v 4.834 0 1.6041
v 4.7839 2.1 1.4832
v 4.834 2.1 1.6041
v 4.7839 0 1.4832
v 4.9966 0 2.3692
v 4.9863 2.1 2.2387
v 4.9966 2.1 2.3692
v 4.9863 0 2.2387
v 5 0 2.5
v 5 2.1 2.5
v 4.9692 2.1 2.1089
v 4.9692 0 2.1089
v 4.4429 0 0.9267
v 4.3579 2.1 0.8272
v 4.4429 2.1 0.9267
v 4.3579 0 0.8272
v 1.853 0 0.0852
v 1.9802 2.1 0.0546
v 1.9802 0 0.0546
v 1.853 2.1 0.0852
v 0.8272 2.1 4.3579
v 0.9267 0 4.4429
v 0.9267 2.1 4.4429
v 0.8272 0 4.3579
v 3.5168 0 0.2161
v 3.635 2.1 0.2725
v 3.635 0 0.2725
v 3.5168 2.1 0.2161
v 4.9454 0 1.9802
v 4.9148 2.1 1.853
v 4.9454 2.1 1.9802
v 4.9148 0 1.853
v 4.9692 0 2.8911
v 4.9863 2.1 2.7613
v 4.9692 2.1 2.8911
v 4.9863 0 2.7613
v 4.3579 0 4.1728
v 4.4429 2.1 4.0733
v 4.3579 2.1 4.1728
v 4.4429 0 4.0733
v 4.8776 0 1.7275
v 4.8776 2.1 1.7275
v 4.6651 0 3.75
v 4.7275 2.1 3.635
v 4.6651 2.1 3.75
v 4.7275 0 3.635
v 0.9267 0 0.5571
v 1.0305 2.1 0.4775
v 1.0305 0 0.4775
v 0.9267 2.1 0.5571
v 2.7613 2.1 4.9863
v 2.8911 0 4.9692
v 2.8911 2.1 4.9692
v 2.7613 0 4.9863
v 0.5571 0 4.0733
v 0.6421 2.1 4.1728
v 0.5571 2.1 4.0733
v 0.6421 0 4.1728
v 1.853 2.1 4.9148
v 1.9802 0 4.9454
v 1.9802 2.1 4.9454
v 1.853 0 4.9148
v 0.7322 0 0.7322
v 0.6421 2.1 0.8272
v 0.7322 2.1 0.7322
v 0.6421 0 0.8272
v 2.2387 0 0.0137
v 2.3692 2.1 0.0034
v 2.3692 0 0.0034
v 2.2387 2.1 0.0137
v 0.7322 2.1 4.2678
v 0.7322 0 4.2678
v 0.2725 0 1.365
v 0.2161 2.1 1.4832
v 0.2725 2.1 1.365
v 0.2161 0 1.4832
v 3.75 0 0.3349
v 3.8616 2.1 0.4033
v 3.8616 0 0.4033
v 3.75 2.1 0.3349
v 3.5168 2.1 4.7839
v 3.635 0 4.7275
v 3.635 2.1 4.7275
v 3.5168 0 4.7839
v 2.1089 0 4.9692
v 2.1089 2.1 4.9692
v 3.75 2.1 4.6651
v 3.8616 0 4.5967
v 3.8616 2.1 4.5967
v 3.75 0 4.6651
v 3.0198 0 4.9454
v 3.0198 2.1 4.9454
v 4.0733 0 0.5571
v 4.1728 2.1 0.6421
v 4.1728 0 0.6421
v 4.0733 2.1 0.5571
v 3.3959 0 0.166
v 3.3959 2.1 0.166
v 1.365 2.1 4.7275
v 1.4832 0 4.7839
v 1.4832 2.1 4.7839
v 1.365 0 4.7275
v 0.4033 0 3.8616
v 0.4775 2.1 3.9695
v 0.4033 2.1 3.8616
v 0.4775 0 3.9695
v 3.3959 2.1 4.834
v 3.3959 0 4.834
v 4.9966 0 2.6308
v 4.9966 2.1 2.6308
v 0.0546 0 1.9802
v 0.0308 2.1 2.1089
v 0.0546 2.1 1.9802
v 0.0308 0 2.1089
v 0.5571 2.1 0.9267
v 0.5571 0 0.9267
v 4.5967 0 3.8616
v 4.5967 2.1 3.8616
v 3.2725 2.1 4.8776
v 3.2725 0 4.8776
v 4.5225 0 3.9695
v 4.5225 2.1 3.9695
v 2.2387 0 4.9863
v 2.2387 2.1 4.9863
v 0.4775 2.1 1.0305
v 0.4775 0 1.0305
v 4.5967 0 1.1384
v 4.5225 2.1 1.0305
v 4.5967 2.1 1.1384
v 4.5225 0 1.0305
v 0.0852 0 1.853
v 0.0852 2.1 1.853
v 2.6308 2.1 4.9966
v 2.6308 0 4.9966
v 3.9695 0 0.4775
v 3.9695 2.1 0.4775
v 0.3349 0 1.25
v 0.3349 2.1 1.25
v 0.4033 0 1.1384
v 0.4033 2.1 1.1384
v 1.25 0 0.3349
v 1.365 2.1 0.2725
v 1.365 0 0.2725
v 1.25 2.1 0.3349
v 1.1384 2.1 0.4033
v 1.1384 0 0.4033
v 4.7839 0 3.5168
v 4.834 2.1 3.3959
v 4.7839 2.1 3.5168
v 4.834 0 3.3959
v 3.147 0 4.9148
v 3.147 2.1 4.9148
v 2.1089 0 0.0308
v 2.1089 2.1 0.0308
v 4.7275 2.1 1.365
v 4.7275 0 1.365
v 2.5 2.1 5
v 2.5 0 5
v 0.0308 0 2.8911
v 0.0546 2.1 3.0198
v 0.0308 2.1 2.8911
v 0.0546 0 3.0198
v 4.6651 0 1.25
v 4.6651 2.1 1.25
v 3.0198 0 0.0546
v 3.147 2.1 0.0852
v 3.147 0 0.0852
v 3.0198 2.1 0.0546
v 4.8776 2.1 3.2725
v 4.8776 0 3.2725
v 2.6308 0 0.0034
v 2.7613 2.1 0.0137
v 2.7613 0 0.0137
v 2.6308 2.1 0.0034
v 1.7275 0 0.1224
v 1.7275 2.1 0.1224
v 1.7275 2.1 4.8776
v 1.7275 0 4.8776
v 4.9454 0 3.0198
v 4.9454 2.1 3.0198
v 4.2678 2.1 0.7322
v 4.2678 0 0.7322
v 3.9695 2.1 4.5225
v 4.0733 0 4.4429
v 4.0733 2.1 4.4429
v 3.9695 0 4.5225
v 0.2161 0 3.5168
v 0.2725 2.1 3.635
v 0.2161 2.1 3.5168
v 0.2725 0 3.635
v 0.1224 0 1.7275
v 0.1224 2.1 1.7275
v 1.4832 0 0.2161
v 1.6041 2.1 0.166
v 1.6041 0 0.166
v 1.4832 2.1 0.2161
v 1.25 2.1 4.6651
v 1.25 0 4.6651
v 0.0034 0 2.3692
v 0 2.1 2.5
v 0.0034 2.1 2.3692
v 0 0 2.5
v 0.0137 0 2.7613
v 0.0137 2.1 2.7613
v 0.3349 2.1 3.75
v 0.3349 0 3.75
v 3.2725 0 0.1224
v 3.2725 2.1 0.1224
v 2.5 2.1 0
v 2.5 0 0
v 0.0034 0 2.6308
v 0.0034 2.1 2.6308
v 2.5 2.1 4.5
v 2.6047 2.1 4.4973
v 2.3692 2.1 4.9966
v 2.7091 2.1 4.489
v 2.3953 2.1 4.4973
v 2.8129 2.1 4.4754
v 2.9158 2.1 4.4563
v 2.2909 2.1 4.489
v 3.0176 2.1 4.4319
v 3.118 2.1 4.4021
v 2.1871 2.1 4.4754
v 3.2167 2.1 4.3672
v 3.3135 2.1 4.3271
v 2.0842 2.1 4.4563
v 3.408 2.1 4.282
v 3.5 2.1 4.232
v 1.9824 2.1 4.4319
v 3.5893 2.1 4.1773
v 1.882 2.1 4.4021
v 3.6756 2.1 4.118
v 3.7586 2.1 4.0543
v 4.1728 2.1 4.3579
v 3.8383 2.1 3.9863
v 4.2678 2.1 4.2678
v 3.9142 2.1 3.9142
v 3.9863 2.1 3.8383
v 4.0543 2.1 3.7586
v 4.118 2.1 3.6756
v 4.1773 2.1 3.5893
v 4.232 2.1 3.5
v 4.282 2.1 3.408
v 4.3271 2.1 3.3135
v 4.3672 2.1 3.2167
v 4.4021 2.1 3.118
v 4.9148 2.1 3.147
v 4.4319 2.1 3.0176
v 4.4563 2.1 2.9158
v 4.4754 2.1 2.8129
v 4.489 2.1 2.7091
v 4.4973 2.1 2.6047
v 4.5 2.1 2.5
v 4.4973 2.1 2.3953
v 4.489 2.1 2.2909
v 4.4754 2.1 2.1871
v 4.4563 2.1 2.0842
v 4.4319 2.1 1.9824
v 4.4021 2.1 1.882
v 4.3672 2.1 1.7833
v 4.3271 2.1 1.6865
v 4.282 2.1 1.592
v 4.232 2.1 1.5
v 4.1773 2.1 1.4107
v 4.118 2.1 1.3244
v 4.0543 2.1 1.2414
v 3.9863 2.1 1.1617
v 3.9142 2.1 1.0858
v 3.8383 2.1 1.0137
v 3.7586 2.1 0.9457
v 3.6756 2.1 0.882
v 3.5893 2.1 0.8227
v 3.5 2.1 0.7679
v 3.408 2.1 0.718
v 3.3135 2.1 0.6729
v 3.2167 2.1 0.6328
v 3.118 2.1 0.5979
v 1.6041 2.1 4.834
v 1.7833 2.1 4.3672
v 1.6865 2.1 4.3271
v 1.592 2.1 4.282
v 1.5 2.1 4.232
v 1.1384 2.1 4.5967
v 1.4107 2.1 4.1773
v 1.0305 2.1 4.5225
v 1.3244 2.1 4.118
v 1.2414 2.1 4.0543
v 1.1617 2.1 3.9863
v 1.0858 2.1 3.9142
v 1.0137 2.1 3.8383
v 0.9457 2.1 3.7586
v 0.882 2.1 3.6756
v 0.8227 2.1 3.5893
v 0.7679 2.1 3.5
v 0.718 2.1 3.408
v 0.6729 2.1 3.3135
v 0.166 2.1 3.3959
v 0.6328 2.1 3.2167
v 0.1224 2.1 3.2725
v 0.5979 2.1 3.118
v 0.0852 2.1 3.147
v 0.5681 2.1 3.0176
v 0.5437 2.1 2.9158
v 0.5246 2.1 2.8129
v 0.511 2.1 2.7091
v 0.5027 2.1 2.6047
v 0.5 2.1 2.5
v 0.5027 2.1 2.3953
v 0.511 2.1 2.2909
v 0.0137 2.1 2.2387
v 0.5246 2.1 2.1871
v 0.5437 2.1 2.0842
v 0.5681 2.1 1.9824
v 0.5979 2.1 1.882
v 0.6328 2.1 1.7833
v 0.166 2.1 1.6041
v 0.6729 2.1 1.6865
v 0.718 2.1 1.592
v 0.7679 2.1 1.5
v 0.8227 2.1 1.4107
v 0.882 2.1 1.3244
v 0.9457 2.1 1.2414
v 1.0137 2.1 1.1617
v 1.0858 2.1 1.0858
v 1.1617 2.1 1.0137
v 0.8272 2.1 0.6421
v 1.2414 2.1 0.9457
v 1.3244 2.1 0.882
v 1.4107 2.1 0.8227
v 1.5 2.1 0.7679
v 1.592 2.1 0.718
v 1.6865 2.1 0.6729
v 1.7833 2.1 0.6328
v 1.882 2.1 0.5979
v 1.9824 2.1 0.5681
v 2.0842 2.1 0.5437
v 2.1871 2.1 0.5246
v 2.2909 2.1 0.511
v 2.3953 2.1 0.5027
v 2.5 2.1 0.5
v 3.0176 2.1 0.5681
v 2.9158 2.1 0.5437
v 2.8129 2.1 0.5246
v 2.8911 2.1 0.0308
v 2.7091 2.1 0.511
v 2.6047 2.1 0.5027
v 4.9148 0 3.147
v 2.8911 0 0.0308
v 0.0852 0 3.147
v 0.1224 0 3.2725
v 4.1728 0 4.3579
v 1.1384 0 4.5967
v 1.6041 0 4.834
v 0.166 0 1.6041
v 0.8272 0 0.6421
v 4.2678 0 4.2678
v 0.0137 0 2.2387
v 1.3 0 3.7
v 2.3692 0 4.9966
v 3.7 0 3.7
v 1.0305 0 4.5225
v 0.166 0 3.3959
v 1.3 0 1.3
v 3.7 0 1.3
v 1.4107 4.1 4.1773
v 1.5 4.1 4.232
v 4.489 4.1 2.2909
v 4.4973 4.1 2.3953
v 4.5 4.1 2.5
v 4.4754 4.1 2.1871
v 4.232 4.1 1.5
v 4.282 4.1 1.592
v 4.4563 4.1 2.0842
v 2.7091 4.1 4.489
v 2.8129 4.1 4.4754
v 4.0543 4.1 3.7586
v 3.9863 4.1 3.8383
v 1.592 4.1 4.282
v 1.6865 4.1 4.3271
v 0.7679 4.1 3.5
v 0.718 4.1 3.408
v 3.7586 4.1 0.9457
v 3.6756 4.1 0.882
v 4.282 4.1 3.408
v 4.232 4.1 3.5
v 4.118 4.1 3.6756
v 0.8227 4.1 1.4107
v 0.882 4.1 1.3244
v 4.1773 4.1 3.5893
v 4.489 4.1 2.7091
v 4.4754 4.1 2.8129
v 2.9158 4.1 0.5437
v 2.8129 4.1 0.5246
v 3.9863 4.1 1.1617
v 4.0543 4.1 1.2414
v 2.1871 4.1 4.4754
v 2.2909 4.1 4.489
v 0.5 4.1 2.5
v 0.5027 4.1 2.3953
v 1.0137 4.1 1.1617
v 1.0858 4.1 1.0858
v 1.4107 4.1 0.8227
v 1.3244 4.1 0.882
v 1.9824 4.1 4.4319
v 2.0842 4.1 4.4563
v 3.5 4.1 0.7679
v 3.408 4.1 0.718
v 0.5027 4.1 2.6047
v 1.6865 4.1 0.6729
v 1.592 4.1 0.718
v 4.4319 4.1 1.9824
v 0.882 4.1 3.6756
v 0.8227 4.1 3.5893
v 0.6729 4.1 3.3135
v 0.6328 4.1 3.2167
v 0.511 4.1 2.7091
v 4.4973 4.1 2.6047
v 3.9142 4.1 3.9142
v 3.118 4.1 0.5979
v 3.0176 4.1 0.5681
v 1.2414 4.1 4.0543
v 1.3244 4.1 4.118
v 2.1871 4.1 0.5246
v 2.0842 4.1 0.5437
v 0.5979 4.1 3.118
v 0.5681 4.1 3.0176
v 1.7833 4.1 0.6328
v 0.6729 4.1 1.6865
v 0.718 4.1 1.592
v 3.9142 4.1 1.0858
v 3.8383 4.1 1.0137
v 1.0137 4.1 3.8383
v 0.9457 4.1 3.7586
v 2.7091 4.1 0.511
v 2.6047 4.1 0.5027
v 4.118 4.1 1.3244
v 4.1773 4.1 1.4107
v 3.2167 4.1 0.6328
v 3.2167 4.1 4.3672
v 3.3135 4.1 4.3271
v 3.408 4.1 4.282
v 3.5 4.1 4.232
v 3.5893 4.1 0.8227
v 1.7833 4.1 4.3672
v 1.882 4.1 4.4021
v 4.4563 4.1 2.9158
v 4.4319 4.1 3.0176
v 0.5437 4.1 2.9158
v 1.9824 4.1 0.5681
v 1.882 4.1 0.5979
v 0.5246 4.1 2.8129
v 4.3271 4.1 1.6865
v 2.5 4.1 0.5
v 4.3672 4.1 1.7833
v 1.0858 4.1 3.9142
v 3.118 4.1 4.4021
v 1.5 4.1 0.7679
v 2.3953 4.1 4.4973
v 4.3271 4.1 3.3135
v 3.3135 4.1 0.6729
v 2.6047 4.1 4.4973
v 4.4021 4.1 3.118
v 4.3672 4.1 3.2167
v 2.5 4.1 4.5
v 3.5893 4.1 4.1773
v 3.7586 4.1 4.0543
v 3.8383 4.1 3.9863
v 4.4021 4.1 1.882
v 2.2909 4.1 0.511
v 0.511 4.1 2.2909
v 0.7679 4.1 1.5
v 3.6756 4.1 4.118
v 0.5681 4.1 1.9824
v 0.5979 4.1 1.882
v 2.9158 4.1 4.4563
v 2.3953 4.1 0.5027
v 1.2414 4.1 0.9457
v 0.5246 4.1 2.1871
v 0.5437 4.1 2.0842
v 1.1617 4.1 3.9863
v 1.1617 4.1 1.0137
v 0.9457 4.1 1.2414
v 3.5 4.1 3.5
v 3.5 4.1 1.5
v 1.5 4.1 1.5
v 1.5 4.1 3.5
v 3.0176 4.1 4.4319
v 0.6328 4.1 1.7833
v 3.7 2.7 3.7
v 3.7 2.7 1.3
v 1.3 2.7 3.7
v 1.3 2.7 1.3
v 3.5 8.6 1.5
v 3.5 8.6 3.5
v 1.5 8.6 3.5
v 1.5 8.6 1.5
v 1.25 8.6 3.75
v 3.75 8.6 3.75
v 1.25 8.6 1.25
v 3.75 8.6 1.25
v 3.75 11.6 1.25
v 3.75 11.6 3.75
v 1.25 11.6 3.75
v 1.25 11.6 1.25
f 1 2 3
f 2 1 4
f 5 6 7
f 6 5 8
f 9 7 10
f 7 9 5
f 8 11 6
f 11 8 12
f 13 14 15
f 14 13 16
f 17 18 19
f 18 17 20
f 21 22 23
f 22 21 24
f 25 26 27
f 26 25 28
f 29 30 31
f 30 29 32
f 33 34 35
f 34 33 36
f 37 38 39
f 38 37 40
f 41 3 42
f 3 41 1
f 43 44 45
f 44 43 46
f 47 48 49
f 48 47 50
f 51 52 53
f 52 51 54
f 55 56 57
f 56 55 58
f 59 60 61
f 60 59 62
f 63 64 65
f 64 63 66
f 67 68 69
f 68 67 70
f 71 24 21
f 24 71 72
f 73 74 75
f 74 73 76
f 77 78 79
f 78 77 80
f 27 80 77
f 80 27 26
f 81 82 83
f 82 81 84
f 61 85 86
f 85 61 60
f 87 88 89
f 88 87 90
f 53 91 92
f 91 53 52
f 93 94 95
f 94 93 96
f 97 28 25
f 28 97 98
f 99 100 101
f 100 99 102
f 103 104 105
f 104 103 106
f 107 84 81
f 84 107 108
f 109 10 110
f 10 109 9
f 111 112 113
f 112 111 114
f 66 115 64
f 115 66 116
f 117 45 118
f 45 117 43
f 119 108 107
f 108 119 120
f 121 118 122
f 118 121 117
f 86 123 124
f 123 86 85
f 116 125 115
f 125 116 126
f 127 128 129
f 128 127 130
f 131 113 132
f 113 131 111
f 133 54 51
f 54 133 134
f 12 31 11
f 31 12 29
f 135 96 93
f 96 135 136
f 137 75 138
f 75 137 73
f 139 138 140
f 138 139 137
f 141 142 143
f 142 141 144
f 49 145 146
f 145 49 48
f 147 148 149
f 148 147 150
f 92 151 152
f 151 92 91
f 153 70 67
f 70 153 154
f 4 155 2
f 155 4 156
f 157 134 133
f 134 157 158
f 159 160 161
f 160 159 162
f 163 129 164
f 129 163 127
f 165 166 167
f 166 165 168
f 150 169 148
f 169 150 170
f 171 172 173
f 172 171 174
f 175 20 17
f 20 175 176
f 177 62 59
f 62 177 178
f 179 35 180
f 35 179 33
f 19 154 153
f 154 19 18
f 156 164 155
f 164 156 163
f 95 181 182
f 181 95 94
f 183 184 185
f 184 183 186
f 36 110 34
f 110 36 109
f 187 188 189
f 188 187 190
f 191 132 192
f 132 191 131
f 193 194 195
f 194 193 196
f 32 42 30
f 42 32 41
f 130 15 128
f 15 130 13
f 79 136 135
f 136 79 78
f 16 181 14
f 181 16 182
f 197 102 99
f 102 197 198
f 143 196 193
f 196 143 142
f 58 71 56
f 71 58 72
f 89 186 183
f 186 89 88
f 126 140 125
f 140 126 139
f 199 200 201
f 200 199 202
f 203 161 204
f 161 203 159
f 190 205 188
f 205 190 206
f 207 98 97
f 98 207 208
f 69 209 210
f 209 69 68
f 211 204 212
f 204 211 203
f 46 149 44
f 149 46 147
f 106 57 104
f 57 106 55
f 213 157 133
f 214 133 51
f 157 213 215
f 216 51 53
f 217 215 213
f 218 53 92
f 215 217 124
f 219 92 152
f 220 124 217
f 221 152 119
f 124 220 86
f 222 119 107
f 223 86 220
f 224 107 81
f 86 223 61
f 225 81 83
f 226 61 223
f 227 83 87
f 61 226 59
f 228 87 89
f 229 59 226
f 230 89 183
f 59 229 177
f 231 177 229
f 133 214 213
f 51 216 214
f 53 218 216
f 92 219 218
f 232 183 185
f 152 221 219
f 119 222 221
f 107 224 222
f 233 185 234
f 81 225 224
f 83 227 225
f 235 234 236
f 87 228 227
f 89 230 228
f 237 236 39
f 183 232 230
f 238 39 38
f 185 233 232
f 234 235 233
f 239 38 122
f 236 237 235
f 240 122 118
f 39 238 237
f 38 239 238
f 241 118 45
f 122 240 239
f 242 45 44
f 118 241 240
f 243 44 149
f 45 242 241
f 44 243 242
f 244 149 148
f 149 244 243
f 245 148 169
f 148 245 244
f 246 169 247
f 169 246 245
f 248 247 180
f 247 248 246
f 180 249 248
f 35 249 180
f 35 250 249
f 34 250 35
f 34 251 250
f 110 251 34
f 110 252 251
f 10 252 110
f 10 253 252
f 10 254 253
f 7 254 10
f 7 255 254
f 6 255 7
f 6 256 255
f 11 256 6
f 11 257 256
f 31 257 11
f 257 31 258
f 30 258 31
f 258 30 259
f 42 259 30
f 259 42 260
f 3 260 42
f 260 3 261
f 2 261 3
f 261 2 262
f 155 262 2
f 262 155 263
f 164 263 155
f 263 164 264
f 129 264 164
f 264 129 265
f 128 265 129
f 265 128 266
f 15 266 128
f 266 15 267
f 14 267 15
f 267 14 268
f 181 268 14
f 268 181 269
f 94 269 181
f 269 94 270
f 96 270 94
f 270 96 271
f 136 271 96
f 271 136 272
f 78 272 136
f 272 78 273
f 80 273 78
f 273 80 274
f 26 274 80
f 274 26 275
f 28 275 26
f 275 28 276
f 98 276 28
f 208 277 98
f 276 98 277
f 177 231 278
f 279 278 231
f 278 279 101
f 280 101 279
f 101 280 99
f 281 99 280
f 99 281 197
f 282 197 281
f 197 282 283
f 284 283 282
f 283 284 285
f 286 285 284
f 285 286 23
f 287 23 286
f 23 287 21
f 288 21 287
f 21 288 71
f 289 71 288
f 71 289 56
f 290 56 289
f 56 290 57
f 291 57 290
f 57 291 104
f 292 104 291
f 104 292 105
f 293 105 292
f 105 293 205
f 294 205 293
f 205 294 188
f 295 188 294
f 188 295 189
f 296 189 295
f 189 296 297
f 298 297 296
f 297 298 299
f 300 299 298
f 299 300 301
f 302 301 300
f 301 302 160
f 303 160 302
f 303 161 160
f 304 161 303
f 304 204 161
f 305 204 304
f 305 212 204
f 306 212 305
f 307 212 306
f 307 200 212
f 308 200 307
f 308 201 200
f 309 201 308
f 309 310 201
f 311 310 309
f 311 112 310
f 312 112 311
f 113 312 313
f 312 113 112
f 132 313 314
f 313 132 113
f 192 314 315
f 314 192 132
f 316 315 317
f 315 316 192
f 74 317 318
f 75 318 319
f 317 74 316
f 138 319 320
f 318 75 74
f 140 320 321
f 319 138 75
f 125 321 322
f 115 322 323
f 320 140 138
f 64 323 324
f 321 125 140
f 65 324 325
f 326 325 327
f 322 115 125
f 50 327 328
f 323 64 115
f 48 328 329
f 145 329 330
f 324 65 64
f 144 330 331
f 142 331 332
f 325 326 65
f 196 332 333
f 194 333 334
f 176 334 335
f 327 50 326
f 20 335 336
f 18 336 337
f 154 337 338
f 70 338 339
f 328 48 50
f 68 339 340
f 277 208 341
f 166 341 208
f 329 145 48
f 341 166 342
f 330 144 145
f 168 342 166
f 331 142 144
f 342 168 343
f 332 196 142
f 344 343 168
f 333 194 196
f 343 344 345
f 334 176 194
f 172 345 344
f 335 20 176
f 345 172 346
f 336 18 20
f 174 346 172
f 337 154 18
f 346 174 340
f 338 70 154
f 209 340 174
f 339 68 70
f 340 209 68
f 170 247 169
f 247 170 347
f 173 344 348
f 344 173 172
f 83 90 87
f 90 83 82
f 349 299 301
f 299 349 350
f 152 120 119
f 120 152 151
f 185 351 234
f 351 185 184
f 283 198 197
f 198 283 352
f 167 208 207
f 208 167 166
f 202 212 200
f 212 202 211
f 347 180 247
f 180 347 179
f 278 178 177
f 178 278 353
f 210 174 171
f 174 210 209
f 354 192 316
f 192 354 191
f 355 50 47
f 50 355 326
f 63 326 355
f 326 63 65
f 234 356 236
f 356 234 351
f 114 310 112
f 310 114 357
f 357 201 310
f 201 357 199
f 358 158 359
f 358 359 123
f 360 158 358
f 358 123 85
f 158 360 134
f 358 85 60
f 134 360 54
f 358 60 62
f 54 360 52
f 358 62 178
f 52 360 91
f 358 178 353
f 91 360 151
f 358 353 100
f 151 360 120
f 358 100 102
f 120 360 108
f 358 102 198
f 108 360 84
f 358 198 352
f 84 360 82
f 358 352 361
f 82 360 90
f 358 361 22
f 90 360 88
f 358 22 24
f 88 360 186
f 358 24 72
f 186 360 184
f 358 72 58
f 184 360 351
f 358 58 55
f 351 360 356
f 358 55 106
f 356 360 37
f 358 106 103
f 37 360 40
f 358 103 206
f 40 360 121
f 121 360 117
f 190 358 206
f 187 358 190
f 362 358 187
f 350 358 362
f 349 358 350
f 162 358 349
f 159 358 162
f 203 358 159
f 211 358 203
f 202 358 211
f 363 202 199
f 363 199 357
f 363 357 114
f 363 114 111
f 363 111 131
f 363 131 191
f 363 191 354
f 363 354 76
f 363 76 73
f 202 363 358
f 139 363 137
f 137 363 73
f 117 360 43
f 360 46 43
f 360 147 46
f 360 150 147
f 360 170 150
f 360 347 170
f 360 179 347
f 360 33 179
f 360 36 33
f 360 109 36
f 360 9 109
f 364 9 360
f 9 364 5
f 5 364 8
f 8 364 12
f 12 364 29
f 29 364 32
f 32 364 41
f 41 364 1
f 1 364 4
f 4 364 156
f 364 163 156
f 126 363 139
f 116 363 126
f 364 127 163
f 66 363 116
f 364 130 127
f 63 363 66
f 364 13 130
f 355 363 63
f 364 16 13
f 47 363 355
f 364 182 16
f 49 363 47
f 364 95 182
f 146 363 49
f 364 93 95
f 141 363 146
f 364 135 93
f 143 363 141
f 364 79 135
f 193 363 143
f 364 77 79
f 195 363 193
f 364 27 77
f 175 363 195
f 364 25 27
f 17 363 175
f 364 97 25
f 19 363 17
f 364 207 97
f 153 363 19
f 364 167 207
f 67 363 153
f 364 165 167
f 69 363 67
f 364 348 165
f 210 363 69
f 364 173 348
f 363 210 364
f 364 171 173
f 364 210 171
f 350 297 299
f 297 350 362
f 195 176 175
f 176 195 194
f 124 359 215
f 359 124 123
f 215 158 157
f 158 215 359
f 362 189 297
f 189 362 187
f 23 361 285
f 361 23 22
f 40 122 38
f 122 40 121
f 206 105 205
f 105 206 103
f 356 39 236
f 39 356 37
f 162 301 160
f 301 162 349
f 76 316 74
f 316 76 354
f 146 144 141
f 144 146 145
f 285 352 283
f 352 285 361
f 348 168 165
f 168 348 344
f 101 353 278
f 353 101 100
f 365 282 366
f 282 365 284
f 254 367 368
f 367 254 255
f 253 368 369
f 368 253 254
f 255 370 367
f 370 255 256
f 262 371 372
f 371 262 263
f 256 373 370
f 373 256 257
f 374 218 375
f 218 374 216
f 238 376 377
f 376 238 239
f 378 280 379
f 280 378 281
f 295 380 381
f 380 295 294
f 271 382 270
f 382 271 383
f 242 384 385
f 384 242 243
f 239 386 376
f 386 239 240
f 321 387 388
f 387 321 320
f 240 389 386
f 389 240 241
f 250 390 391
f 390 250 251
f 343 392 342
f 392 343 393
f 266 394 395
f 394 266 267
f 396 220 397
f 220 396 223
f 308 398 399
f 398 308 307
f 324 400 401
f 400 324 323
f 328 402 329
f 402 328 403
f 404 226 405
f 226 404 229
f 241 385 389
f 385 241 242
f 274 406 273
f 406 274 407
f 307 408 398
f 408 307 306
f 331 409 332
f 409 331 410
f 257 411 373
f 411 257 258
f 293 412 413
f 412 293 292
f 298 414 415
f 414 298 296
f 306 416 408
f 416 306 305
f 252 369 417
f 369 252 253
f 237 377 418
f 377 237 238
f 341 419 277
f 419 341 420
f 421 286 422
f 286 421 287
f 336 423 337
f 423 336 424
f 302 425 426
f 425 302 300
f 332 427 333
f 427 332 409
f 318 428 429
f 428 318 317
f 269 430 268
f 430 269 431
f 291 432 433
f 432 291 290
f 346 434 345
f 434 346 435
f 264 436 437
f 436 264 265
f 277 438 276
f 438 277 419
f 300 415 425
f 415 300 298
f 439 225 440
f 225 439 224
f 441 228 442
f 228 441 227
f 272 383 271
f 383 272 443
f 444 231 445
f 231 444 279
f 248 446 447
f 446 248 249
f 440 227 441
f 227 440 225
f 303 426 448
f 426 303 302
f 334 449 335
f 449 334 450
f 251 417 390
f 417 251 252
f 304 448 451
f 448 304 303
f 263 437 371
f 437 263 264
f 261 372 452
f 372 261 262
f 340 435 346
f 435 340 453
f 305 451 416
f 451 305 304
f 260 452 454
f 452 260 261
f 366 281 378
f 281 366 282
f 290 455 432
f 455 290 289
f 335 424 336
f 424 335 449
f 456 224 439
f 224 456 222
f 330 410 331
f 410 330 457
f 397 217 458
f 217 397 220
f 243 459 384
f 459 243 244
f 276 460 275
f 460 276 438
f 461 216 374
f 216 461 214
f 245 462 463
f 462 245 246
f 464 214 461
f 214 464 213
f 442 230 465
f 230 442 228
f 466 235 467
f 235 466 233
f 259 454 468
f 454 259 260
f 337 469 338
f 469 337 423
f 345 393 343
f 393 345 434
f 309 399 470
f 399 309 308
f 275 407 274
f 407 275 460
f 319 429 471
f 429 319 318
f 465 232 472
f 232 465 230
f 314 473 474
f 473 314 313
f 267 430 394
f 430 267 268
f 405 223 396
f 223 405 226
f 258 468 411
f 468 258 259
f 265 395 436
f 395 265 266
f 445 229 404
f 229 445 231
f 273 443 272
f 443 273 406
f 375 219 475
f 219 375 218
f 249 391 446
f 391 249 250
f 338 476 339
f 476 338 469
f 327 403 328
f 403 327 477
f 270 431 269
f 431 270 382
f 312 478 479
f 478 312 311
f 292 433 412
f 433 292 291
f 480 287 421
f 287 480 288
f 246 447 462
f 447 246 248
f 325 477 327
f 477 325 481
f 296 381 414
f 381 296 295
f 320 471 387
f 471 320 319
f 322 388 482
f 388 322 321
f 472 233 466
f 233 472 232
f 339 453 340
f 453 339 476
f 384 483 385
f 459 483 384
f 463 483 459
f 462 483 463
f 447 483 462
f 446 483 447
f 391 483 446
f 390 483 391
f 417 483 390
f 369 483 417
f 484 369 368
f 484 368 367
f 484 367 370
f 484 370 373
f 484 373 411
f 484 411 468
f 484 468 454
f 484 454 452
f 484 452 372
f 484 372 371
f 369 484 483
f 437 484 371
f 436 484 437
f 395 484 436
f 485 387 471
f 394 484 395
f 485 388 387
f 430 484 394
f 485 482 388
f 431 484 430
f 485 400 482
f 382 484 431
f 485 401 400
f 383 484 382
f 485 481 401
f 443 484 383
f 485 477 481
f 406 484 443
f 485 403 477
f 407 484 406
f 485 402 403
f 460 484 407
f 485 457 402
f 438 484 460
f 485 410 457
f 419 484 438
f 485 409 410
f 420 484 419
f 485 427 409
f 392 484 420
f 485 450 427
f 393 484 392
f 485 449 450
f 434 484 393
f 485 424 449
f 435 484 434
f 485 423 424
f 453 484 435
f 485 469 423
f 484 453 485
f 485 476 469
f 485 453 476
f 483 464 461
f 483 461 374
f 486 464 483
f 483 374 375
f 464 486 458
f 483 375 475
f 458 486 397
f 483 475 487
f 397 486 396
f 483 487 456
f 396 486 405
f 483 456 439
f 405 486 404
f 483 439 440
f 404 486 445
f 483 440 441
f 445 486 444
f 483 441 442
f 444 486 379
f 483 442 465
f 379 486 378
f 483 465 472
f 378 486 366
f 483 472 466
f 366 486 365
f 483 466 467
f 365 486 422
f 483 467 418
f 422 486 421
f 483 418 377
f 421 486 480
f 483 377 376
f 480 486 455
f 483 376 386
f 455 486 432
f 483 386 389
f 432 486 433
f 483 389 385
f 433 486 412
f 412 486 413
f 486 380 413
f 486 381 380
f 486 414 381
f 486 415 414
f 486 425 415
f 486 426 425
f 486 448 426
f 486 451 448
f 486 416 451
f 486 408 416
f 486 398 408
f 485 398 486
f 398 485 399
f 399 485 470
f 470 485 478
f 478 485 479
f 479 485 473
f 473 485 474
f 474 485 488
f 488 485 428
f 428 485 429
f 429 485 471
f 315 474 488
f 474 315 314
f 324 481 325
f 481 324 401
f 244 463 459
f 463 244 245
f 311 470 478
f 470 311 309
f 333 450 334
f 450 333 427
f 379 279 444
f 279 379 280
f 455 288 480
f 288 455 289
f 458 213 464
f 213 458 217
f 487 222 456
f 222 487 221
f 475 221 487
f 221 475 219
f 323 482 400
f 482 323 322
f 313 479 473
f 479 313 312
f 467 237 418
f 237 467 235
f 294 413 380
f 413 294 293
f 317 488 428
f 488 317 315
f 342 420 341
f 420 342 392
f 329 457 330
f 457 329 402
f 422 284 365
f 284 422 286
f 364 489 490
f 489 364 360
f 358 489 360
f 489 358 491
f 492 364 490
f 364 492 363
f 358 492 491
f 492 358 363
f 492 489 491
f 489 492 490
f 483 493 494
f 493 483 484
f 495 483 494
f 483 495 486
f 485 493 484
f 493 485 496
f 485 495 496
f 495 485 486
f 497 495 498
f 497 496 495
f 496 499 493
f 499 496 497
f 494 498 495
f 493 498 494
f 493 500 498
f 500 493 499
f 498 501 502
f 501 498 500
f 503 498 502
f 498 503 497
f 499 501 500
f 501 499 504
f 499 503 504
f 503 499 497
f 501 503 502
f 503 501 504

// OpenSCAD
// file: shared/measurements.scad
/*
 * Keyboard Measurements
 */

pcb_thickness = 1.6;

// The plastic used to cover the TP mount's metal part to make
// sure it doesn't short the switch pins.
tp_isolator_thickness = 0.4;




/*
 * Kailh Choc Switch Measurements
 * http://www.kailh.com/uploads/allimg/171208/2-1G20Q0432C29.png
 */

// The width of the choc switch where it touches the bottom plate
choc_width_bottom = 13.6;

// The width of the choc switch with the notch that sits above the top plate
choc_width_notch = 15.0;

// How much the notch adds in width on each side
// (0.7mm)
choc_notch_width = (choc_width_notch - choc_width_bottom) / 2;

// The space from the pcb until the choc switch notch
choc_notch_to_pcb_z_space = 2.2;

// Total x distance between switch center points (choc x spacing)
choc_spacing_x = 18;

// The space between two switches at the bottom plate
// (4.4mm)
choc_switches_space_between_bottom = choc_spacing_x - choc_width_bottom;

// The space between two switches at the top with the little notch
// (3mm)
choc_switches_space_between_top = choc_spacing_x - choc_width_notch;
// file: trackpoint_extension.scad
include <shared/measurements.scad>

// Overlap Buffer for cutting
ovb = 0.01;

module draw_trackpoint_extension(
        // The height from the pcb to where you want the cap to end
        desired_cap_height,

        // How far below the pcb the TP is mounted (from start of the stem)
        tp_mounting_distance,

        // The measured width and height of the TP stem
        tp_stem_width,
        tp_stem_height,

        // The red cap dimensions
        tp_cap_height_total,
        tp_cap_hole_height,
        tp_cap_hole_width,

        // By how much you want to increase the adapter hole compared to the
        // actual TP stem width
        adapter_hole_incr=0.2,

        // The width of the adapter around the TP stem
        adapter_width_below_pcb=5.0,
        adapter_width_above_pcb=4.0,

        // By how much you want to increase the tip for a tighter cap fit
        tip_width_incr=0,

        // The thickness of the PCB
        pcb_height=1.6) {

    adapter_radius_below_pcb = adapter_width_below_pcb / 2;
    adapter_radius_above_pcb = adapter_width_above_pcb / 2;
    adapter_height = (
        tp_mounting_distance + pcb_height + choc_notch_to_pcb_z_space - 0.2
    );

    adapter_hole_width = tp_stem_width + adapter_hole_incr;
    adapter_hole_height = tp_stem_height + adapter_hole_incr;
    adapter_hole_offset = adapter_radius_below_pcb - adapter_hole_width / 2;

    adapter_hole_corner_distance = (
        sqrt(
            adapter_hole_width * adapter_hole_width +
            adapter_hole_width * adapter_hole_width
        ) / 2
    );
    adapter_wall_thickness_below_pcb = (
        adapter_radius_below_pcb - adapter_hole_corner_distance
    );
    adapter_wall_thickness_above_pcb = (
        adapter_radius_above_pcb - adapter_hole_corner_distance
    );
    adapter_wall_thickness_top = adapter_height - adapter_hole_height;

    // Since a portion of the extension adapter will be below the top of the
    // pcb, we calculate the length that it will extend above the pcb here
    adapter_height_below_pcb = pcb_height + tp_mounting_distance;
    adapter_height_above_pcb = adapter_height - adapter_height_below_pcb;

    tip_width = tp_cap_hole_width + tip_width_incr;
    tip_height = tp_cap_hole_height;
    tip_offset = adapter_radius_below_pcb - tip_width / 2;

    // The height added on top of the stem extension. Needed for the total TP
    // extension height
    tp_cap_top_height = tp_cap_height_total - tp_cap_hole_height;

    // Height of the part between the mount at the bottom and tip at the top
    extension_height = (
        desired_cap_height - tp_cap_top_height - tip_height
        - adapter_height_above_pcb
    );

    extension_width = 2;
    extension_offset = adapter_radius_below_pcb - extension_width / 2;

    total_height = adapter_height + extension_height + tip_height;
    above_pcb_height = total_height - adapter_height_below_pcb;
    above_pcb_height_cap = above_pcb_height + tp_cap_top_height;

    center = [false, false, false];

    echo(str("Building TP extension..."));
    echo(str("\t Total height: ", total_height, "mm"));
    echo(str("\t Below PCB height: ", adapter_height_below_pcb, "mm"));
    echo(str("\t Above PCB height: ", above_pcb_height, "mm"));
    echo(str("\t Above PCB height with cap: ", above_pcb_height_cap, "mm"));
    echo(str("\t Adapter height: ", adapter_height, "mm"));
    echo(str("\t Adapter width below pcb: ", adapter_width_below_pcb, "mm"));
    echo(str("\t Adapter width above pcb: ", adapter_width_above_pcb, "mm"));
    echo(str("\t Adapter hole height: ", adapter_hole_height, "mm (+", adapter_hole_height - tp_stem_height, "mm)"));
    echo(str("\t Adapter hole width: ", adapter_hole_width, "mm (+", adapter_hole_width - tp_stem_width, "mm)"));
    echo(str("\t Adapter wall thickness below pcb: ", adapter_wall_thickness_below_pcb, "mm"));
    echo(str("\t Adapter wall thickness above pcb: ", adapter_wall_thickness_above_pcb, "mm"));
    echo(str("\t Adapter wall thickness top: ", adapter_wall_thickness_top, "mm"));

    difference() {

        union() {
            // Adapter below pcb
            translate([adapter_radius_below_pcb, 0, adapter_radius_below_pcb])
            rotate([-90, 0, 0])
                cylinder(
                    $fn=120,
                    h=adapter_height_below_pcb,
                    r=adapter_radius_below_pcb
                );

            // Adapter above pcb
            translate([
                adapter_radius_below_pcb,
                adapter_height_below_pcb,
                adapter_radius_below_pcb
            ])
            rotate([-90, 0, 0])
                cylinder(
                    $fn=120,
                    h=adapter_height_above_pcb,
                    r=adapter_radius_above_pcb
                );
        }

        // Hole
        translate([adapter_hole_offset, -ovb, adapter_hole_offset])
            cube([
                adapter_hole_width,
                adapter_hole_height + ovb,
                adapter_hole_width
            ]);
    };

    // Top extension
    translate([+extension_offset, +adapter_height, +extension_offset])
        cube(
            [extension_width, extension_height, extension_width]
        );

    // Tip for red cap
    translate([+tip_offset, +adapter_height + extension_height, +tip_offset])
        cube([tip_width, tip_height, tip_width]);
}
// file: export_tp_green_t430.scad
use <trackpoint_extension.scad>

/*
 * Parameters
 */

// The height above the pcb where you want the top of the red cap to be
desired_cap_height_default = 10.5;

// By how much you want to increase the adapter hole compared to the
// actual TP stem width
adapter_hole_incr_default = 0.2;

// How wide the adapter should be below and above the pcb.
// Pay attention to the adapter wall thickness calculations in the logs to
// ensure it is thick enough to withstand the pressure of the TP.
//
// You also need to consider the size of your TP hole, as well as how much your
// switches are going to portrude into the hole.
adapter_width_below_pcb_default = 5;
adapter_width_above_pcb_default = 4;

// Thickness of the pcb
pcb_height_default = 1.6;

// How far the TP is mounted BELOW the PCB.
// This should include the thickness of any plastic or electrical tape you use
// to isolate the TP mount.
// This TP is super large, so it will be at least 0.5mm below the pcb
tp_mounting_distance_default = 0.5;

// By how much you want to increase the tip for a tighter cap fit
tip_width_incr_default = 0;


/*
 * TP Measurements
 */

// From bottom metal part to stem top
tp_total_height = 5.0;

// The metal and black bottom part.
// This is the height that sticks out below the pcb if the
// TP is mounted totally flush.
tp_board_thickness = 2.5;

// The height of the white stem
// (2.5mm)
tp_stem_height = tp_total_height - tp_board_thickness;

// TP white stem dimensions
tp_stem_width = 2.2;
tp_stem_diameter = 3.0;

// TP dot dimensions
tp_cap_height_total = 6.0;
tp_cap_hole_height = 5.0;
tp_cap_hole_width = tp_stem_width;


module draw_tp_ext_green_t430(
        desired_cap_height=desired_cap_height_default,
        tp_mounting_distance=tp_mounting_distance_default,
        adapter_hole_incr=adapter_hole_incr_default,
        adapter_width_below_pcb=adapter_width_below_pcb_default,
        adapter_width_above_pcb=adapter_width_above_pcb_default,
        tip_width_incr=tip_width_incr_default,
        pcb_height=pcb_height_default) {

    draw_trackpoint_extension(
        desired_cap_height=desired_cap_height,

        // How far below the pcb the TP is mounted (from start of the stem)
        tp_mounting_distance=tp_mounting_distance,

        // The measured width and height of the TP stem
        tp_stem_width=tp_stem_width,
        tp_stem_height=tp_stem_height,

        // The red cap dimensions
        tp_cap_height_total=tp_cap_height_total,
        tp_cap_hole_height=tp_cap_hole_height,
        tp_cap_hole_width=tp_cap_hole_width,

        // By how much you want to increase the adapter hole compared to the
        // actual TP stem width
        adapter_hole_incr=adapter_hole_incr,

        // The width of the adapter around the TP stem
        adapter_width_below_pcb=adapter_width_below_pcb,
        adapter_width_above_pcb=adapter_width_above_pcb,

        // By how much you want to increase the tip for a tighter cap fit
        tip_width_incr=tip_width_incr,

        // The thickness of the PCB
        pcb_height=pcb_height
    );
}

// Allow inclusion of this file without running if do_not_run is set to true
// before the inclusion
if(is_undef(do_not_run) || do_not_run == false) {
    draw_tp_ext_green_t430();
}
// main file
do_not_run = true;
include <export_tp_green_t430.scad>

// Dimensions for cap of TP Red T460s
tp_cap_height_total = 4.0;
tp_cap_hole_height = 3.0;
tp_cap_hole_width = 2.5;

draw_tp_ext_green_t430();
